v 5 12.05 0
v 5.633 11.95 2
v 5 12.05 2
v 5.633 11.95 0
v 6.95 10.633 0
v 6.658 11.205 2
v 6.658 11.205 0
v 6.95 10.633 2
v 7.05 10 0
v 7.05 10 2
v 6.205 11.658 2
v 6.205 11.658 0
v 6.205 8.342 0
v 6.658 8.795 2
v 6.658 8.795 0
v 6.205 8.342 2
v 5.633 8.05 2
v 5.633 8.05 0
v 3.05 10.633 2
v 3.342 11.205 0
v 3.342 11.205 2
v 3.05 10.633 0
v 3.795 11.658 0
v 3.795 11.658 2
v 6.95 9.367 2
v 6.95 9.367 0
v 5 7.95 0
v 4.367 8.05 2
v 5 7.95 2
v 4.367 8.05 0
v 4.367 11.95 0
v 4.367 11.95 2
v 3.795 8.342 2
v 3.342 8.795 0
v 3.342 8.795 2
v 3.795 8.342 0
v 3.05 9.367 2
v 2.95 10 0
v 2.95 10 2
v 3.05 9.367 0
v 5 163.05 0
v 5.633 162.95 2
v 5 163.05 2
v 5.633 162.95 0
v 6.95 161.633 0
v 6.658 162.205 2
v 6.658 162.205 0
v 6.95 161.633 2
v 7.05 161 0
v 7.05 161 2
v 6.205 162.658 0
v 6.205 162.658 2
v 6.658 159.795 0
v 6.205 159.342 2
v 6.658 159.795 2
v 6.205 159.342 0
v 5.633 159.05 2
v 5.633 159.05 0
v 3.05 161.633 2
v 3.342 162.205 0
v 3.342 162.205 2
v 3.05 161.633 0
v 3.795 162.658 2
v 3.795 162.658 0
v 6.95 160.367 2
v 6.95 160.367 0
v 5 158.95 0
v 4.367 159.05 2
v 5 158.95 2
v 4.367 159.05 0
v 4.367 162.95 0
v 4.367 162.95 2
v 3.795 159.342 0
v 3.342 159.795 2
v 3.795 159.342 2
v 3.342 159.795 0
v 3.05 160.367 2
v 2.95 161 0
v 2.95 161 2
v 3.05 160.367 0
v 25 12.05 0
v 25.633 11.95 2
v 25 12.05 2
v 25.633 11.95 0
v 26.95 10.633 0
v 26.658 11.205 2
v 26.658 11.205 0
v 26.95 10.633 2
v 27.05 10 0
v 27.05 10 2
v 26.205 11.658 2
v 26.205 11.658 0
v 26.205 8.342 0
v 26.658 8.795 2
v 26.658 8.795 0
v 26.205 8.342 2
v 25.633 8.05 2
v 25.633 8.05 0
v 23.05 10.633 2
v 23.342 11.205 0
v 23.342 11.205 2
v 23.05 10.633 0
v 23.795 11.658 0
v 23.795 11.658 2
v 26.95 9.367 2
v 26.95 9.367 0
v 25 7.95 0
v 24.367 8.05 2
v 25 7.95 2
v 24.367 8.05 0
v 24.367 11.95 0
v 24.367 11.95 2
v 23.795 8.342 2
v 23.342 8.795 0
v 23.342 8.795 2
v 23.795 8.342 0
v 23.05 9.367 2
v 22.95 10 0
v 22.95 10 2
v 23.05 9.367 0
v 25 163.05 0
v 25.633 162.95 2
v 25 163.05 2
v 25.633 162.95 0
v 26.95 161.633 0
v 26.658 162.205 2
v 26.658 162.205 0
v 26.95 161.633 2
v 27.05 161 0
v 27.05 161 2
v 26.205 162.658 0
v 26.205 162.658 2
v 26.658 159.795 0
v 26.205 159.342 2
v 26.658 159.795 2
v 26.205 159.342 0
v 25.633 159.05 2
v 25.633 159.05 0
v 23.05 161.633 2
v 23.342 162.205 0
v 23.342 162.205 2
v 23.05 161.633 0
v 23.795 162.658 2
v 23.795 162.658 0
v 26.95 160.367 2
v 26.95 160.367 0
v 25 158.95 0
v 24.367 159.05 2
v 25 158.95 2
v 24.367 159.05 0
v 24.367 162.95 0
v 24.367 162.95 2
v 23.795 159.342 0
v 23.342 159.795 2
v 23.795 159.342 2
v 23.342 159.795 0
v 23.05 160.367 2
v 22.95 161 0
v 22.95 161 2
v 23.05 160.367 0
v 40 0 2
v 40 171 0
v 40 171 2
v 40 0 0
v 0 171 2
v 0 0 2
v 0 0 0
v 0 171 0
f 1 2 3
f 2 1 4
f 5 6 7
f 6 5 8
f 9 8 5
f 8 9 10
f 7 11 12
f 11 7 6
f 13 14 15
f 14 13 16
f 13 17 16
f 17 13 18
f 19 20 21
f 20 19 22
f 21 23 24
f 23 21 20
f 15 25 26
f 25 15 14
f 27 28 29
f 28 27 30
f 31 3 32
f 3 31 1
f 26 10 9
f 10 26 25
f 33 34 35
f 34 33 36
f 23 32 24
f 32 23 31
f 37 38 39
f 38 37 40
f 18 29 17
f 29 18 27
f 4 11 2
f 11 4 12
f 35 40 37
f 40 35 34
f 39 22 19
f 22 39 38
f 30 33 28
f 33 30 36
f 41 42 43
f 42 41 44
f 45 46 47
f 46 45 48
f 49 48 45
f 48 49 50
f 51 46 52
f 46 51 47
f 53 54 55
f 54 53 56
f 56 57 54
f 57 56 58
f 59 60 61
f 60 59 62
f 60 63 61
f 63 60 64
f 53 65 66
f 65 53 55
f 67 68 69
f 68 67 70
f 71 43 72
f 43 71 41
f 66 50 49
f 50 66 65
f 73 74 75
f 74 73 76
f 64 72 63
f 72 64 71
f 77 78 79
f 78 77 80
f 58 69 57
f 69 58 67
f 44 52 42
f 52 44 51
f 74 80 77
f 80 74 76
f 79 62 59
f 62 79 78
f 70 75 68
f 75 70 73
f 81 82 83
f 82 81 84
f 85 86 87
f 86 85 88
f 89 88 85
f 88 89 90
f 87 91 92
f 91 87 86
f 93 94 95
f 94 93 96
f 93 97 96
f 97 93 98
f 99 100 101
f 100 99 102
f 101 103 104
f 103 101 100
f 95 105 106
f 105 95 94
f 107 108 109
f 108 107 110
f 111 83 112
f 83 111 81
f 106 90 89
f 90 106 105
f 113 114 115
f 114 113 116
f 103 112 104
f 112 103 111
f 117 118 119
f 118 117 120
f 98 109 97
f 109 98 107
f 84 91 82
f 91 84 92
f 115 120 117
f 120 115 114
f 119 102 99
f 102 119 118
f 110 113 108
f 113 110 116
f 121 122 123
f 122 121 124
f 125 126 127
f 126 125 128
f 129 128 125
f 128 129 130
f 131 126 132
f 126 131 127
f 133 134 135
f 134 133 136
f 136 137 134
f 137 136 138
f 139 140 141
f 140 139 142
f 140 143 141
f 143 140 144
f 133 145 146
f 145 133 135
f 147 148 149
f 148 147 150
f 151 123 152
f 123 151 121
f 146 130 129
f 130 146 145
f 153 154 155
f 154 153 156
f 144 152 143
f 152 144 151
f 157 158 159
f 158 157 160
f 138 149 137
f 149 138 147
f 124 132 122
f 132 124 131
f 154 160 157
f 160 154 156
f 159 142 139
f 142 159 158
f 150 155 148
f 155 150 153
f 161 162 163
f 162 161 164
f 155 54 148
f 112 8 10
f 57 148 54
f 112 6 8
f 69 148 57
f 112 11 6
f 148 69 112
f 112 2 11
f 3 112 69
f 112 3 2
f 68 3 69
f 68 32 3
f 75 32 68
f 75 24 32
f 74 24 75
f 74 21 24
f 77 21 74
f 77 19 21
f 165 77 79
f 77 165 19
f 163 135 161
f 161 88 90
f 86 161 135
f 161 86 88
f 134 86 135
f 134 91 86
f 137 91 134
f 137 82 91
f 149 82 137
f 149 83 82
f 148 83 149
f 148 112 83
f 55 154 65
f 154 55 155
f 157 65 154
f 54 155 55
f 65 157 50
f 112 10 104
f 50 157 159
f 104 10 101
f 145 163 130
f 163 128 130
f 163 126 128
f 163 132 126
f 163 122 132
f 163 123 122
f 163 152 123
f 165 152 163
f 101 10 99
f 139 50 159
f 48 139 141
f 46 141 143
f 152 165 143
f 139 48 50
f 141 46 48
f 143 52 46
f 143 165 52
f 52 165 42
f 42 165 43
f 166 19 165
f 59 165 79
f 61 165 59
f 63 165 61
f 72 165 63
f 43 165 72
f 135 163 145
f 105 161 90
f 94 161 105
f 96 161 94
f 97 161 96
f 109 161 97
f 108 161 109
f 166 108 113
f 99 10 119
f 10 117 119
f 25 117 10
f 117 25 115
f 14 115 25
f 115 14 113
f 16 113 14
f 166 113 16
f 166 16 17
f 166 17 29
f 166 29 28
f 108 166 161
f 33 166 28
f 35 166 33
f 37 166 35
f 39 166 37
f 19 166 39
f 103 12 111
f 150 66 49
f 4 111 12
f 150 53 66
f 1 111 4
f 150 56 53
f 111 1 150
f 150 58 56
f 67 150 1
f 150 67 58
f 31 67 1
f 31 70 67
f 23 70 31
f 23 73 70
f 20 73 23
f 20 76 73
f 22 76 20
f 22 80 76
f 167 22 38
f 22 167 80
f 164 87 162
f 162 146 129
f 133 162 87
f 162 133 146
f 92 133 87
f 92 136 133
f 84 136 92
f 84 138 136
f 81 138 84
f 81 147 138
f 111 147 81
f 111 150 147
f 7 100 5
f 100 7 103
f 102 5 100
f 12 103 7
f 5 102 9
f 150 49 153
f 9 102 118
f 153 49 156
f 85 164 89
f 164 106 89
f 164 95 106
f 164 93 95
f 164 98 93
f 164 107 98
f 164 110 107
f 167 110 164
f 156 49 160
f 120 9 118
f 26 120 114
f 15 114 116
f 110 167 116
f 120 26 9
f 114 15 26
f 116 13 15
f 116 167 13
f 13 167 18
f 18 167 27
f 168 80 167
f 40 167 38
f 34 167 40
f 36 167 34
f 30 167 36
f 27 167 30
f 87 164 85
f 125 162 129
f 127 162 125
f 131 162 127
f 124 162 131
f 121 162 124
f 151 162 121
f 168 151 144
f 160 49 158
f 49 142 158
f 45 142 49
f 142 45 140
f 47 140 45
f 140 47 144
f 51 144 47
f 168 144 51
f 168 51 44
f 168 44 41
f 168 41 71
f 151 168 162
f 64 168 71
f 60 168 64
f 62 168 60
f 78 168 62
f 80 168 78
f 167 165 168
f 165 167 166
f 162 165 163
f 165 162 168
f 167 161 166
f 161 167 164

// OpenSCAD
// file: bbs_tray.scad
//
// Basic sliding tray to mount in a rack.  Varients of this tray can
// hold different electronic devices.
//
use <bbs_shapes.scad>
length=200;
width=160;
//module prism(l)
//{
//    linear_extrude(height=l) polygon([[0,0], [0,5], [2.5,2.5]]);
//}
module bbs_tray()
{
    difference()
    {
        union()
        {
            cube([length, width, 3], center=false); // Base
            translate([0, 0, 6])rotate([0, 90, 0]) rotate([0, 0, -90]) bbs_prism1(5, length); // Rail
            translate([0, width, 1])rotate([0, 90, 0]) rotate([0, 0, 90]) bbs_prism1(5, length); // Rail
            translate([0, 0, 0]) cube([length, 8, 7], center=false); // Side
            translate([0, width - 8, 0]) cube([length, 8, 7], center=false); // Side
//
            translate([length, 3, 4]) rotate([0, 90, 0]) cylinder($fn=12, h=5, r=3);
            translate([length + 5, 0, 0]) cube([5, 8, 8], center=false); // Knob
            translate([length, width - 4, 4]) rotate([0, 90, 0]) cylinder($fn=12, h=5, r=3);
            translate([length + 5, width - 8, 0]) cube([5, 8, 8], center=false); // Knob
        }
        union()
        {
        }
    }
}

bbs_tray();
// file: bbs_rack.scad
//
// Extendable rack for trays
//

use <bbs_shapes.scad>
use <bbs_tray.scad>
use <bbs_panel.scad>

//height = 115;
width = 161;
length = 200;
screw = 4.1/2;

module bbs_rack(frames)
{
    $fn=20;
    height = (frames+1)*20 + 15;
    rail_offset = 3;
    difference()
    {
        union()
        {
            //
            // Frame
            //
            cube([5, 170, 5]);
            cube([length, 5, 12 + rail_offset]);
            cube([5, 5, height]);
            translate([0, width + 5, 0]) cube([length, 5, 12 + rail_offset]);
            translate([0, width + 5, 0]) cube([5, 5, height]);
            translate([length - 5, 0, 0]) cube([5, width + 10, 3.5]);
            translate([length - 5, 0, 0]) cube([5, 5, height]);
            translate([length - 5, width + 5, 0]) cube([5, 5, height]);
            translate([0, 0, height + 5]) rotate([0, 90, 0]) bbs_prism2(10, length);
            translate([0, width + 10, height + 5]) rotate([270, 0, 0]) rotate([0, 90, 0]) bbs_prism2(10, length);
            //
            // Flanges
            //
            translate([0, 5, 5]) cube([2, 10, height]);
            translate([0, width - 5, 5]) cube([2, 10, height]);
            translate([length - 2, 5, 15 + rail_offset]) cube([2, 10, height - 10 - rail_offset]);
            translate([length - 2, width - 5, 15 + rail_offset]) cube([2, 10, height - 10 - rail_offset]);
            translate([5, 0, 12]) cube([length - 5, 2, height - 10]);
            translate([5, width + 8, 12]) cube([length - 5, 2, height - 10]);
            //
            translate([5, 5, 0]) cube([length - 10, 10, 2]);
            translate([5, width - 5, 0]) cube([length - 10, 10, 2]);
            translate([0, 5, height + 3]) cube([length, 10, 2]);
            translate([0, width - 5, height + 3]) cube([length, 10, 2]);
            //
            // Some bevels on the top flanges this improves printing the top flanges.
            //
            translate([0, 5, height + 1 ]) rotate([11, 0, 0]) cube([length, 10, 2]);
            translate([0, width - 5, height + 3]) rotate([-11, 0, 0]) cube([length, 10, 2]);
            //
            // Other little bits and pieces mostly for support
            //
            translate([length - 2, 5, 15 + rail_offset]) rotate([0, 0, 0]) rotate([0, 90, 0]) bbs_prism2(4, 2);
            translate([length - 2, width + 5, 15 + rail_offset]) rotate([270, 0, 0]) rotate([0, 90, 0]) bbs_prism2(4, 2);
            for(a = [30:20:length - 30])
            {
                translate([a, 0, height + 3]) rotate([0, 90, 0]) bbs_prism2(15, 2);
                translate([a, width + 10, height + 3]) rotate([270, 0, 0]) rotate([0, 90, 0]) bbs_prism2(15, 2);
            }
        }
        //
        // Parts describing things to be removed
        //
        union()
        {
            //
            // Slides fpr rails
            //
            translate([2, 5.01, 11 + rail_offset]) rotate([0, 90, 0]) rotate([0, 0, -90]) bbs_prism1(5.02, length);
            translate([2, width + 4.99, 6 + rail_offset]) rotate([0, 90, 0]) rotate([0, 0, 90]) bbs_prism1(5.02, length);
            //
            // Mounting screw holes - horizontal
            //
            for(a = [20 + rail_offset:20:height])
            {
                translate([10, -1, a]) rotate([-90, 0, 0]) cylinder(r=screw, h=width+20);
                translate([length -10, -1, a]) rotate([-90, 0, 0]) cylinder(r=screw, h=width+20);
                translate([-1, 10, a]) rotate([0, 90, 0]) cylinder(r=screw, h=length+20);
                translate([-1, width, a]) rotate([0, 90, 0]) cylinder(r=screw, h=length+20);
            }
            //
            // Mounting screw holes - vertical
            //
            for(a = [20:20:length-10])
            {
                translate([a, 10, -1]) cylinder(r=screw, h=height + 20);
                translate([a, width , -1]) cylinder(r=screw, h=height + 20);
            }
            //
            // Side vents
            //
            for(a = [20:20:length-20])
            {
                translate([a, -1, 17 + rail_offset]) rotate([-90, 0, 0]) hull() 
                {
                    translate([0, -3, 0]) cylinder(r=7.5, h=width + 20);
                    translate([0, -(height - 25 - rail_offset), 0]) cylinder(r=5, h=width + 20);
                }
            }
            //
            // Round off a couple corners
            //
            translate([length - 2.5, 15.01, 14.99 + rail_offset]) rotate([180, 0, 0]) rotate([0, 90, 0])bbs_fillet(5, 3);
            translate([length - 2.5, width - 5.01, 14.99 + rail_offset]) rotate([90, 0, 0])rotate([0, 90, 0]) bbs_fillet(5, 3);
        }
    }
}

union()
{
    bbs_rack(2);
//    translate([1, 5, 5 + 3]) color("red") bbs_tray();
//    translate([length + 2, 0, 18])rotate([0, 270, 0]) color("blue") bbs_panel(2);
}
// file: bbs_shapes.scad
//
// This is a catalogu of shapes that are used in other structures.  Each shape is
// parameterized to make them more flexible.
//
//===================================
// Triangular prism type 1.  This takes the form of an isosolese right triangle.
// The triangle is oriented with the hypotonuse in the y direction.  Extrusion is in the
// z direction.  Origin is at one end of the hypotonuse.
//
// Parameters
// s - size of triangle (length of hypotonuse)
// l - length of prism
//
module bbs_prism1(s, l)
{
    linear_extrude(height=l) polygon([[0, 0], [0, s], [s/2, s/2]]);
}
//
//===================================
// Triangular prism type 2.  This takes the form of an isosolese right triangle.
// The triangle is oriented with the right angle at the origin.  Extrusion is in the
// z direction.
//
// Parameters
// s - size of triangle (length of sides)
// l - length of prism
//
module bbs_prism2(s, l)
{
    linear_extrude(height=l) polygon([[0, 0], [0, s], [s, 0]]);
}
//
//===================================
// Fillet.  This is a square with a circle removed from it.  The circle
// has a radius equal to the square's sides and is positioned at one of the corners.  The
// length is in the z  direction.
//
// Parameters
// s - size of fillet
// l - length of extrusion
//
module bbs_fillet(s, l)
{
    difference()
    {
        cube([s, s, l]);
        translate([s, s, -0.1]) cylinder(r=s, h=l+0.2);
    }
}
//
//===================================
// Spacer.  This is a cylinder with a cylinder removed from the center of it.  It
// would typically be used to around a bolt to add some space like a standoff or
// as a washer.
//
// Parameters
// od - outside diameter
// id - inside diameter
// height - height
//
module bbs_spacer(od, id, height)
{
    difference()
    {
        cylinder(r=od/2, h=height);
        translate([0, 0, -0.1]) cylinder(r=id/2, h=height + 0.2);
    }
}
//
// Examples
//
//bbs_prism1(3, 5);
//translate([0, 7, 0]) bbs_prism2(3, 5);
//translate([7, 0, 0]) bbs_fillet(3, 5);
bbs_spacer(23, 10, 16);
// main file
//
// Panel for rack.  This can screw on to the front or back of a rack.  This is a basic
// blank panel.  It can be modified with cutouts for any assortment of switches, LEDs,
// LCDs, connectors, and whatever else you can think of.  The height of the panel is
// measured in frames, which is the number of screw holes spaced 20mm apart.
//

use <bbs_shapes.scad>
use <bbs_rack.scad>

module bbs_panel(frames)
{
    $fn = 20;
    length = frames *20;
    width = 161;
    height = 2;
    screw = 4.1/2;
    difference()
    {
        cube([length, width + 10, height]);
        union()
        {
            for(a = [5:20:length-10])
            {
                translate([a, 10, -1]) cylinder(r=screw, h=height + 2);
                translate([a, width, -1]) cylinder(r=screw, h=height + 2);
            }
        }
    }
}

bbs_panel(2);
